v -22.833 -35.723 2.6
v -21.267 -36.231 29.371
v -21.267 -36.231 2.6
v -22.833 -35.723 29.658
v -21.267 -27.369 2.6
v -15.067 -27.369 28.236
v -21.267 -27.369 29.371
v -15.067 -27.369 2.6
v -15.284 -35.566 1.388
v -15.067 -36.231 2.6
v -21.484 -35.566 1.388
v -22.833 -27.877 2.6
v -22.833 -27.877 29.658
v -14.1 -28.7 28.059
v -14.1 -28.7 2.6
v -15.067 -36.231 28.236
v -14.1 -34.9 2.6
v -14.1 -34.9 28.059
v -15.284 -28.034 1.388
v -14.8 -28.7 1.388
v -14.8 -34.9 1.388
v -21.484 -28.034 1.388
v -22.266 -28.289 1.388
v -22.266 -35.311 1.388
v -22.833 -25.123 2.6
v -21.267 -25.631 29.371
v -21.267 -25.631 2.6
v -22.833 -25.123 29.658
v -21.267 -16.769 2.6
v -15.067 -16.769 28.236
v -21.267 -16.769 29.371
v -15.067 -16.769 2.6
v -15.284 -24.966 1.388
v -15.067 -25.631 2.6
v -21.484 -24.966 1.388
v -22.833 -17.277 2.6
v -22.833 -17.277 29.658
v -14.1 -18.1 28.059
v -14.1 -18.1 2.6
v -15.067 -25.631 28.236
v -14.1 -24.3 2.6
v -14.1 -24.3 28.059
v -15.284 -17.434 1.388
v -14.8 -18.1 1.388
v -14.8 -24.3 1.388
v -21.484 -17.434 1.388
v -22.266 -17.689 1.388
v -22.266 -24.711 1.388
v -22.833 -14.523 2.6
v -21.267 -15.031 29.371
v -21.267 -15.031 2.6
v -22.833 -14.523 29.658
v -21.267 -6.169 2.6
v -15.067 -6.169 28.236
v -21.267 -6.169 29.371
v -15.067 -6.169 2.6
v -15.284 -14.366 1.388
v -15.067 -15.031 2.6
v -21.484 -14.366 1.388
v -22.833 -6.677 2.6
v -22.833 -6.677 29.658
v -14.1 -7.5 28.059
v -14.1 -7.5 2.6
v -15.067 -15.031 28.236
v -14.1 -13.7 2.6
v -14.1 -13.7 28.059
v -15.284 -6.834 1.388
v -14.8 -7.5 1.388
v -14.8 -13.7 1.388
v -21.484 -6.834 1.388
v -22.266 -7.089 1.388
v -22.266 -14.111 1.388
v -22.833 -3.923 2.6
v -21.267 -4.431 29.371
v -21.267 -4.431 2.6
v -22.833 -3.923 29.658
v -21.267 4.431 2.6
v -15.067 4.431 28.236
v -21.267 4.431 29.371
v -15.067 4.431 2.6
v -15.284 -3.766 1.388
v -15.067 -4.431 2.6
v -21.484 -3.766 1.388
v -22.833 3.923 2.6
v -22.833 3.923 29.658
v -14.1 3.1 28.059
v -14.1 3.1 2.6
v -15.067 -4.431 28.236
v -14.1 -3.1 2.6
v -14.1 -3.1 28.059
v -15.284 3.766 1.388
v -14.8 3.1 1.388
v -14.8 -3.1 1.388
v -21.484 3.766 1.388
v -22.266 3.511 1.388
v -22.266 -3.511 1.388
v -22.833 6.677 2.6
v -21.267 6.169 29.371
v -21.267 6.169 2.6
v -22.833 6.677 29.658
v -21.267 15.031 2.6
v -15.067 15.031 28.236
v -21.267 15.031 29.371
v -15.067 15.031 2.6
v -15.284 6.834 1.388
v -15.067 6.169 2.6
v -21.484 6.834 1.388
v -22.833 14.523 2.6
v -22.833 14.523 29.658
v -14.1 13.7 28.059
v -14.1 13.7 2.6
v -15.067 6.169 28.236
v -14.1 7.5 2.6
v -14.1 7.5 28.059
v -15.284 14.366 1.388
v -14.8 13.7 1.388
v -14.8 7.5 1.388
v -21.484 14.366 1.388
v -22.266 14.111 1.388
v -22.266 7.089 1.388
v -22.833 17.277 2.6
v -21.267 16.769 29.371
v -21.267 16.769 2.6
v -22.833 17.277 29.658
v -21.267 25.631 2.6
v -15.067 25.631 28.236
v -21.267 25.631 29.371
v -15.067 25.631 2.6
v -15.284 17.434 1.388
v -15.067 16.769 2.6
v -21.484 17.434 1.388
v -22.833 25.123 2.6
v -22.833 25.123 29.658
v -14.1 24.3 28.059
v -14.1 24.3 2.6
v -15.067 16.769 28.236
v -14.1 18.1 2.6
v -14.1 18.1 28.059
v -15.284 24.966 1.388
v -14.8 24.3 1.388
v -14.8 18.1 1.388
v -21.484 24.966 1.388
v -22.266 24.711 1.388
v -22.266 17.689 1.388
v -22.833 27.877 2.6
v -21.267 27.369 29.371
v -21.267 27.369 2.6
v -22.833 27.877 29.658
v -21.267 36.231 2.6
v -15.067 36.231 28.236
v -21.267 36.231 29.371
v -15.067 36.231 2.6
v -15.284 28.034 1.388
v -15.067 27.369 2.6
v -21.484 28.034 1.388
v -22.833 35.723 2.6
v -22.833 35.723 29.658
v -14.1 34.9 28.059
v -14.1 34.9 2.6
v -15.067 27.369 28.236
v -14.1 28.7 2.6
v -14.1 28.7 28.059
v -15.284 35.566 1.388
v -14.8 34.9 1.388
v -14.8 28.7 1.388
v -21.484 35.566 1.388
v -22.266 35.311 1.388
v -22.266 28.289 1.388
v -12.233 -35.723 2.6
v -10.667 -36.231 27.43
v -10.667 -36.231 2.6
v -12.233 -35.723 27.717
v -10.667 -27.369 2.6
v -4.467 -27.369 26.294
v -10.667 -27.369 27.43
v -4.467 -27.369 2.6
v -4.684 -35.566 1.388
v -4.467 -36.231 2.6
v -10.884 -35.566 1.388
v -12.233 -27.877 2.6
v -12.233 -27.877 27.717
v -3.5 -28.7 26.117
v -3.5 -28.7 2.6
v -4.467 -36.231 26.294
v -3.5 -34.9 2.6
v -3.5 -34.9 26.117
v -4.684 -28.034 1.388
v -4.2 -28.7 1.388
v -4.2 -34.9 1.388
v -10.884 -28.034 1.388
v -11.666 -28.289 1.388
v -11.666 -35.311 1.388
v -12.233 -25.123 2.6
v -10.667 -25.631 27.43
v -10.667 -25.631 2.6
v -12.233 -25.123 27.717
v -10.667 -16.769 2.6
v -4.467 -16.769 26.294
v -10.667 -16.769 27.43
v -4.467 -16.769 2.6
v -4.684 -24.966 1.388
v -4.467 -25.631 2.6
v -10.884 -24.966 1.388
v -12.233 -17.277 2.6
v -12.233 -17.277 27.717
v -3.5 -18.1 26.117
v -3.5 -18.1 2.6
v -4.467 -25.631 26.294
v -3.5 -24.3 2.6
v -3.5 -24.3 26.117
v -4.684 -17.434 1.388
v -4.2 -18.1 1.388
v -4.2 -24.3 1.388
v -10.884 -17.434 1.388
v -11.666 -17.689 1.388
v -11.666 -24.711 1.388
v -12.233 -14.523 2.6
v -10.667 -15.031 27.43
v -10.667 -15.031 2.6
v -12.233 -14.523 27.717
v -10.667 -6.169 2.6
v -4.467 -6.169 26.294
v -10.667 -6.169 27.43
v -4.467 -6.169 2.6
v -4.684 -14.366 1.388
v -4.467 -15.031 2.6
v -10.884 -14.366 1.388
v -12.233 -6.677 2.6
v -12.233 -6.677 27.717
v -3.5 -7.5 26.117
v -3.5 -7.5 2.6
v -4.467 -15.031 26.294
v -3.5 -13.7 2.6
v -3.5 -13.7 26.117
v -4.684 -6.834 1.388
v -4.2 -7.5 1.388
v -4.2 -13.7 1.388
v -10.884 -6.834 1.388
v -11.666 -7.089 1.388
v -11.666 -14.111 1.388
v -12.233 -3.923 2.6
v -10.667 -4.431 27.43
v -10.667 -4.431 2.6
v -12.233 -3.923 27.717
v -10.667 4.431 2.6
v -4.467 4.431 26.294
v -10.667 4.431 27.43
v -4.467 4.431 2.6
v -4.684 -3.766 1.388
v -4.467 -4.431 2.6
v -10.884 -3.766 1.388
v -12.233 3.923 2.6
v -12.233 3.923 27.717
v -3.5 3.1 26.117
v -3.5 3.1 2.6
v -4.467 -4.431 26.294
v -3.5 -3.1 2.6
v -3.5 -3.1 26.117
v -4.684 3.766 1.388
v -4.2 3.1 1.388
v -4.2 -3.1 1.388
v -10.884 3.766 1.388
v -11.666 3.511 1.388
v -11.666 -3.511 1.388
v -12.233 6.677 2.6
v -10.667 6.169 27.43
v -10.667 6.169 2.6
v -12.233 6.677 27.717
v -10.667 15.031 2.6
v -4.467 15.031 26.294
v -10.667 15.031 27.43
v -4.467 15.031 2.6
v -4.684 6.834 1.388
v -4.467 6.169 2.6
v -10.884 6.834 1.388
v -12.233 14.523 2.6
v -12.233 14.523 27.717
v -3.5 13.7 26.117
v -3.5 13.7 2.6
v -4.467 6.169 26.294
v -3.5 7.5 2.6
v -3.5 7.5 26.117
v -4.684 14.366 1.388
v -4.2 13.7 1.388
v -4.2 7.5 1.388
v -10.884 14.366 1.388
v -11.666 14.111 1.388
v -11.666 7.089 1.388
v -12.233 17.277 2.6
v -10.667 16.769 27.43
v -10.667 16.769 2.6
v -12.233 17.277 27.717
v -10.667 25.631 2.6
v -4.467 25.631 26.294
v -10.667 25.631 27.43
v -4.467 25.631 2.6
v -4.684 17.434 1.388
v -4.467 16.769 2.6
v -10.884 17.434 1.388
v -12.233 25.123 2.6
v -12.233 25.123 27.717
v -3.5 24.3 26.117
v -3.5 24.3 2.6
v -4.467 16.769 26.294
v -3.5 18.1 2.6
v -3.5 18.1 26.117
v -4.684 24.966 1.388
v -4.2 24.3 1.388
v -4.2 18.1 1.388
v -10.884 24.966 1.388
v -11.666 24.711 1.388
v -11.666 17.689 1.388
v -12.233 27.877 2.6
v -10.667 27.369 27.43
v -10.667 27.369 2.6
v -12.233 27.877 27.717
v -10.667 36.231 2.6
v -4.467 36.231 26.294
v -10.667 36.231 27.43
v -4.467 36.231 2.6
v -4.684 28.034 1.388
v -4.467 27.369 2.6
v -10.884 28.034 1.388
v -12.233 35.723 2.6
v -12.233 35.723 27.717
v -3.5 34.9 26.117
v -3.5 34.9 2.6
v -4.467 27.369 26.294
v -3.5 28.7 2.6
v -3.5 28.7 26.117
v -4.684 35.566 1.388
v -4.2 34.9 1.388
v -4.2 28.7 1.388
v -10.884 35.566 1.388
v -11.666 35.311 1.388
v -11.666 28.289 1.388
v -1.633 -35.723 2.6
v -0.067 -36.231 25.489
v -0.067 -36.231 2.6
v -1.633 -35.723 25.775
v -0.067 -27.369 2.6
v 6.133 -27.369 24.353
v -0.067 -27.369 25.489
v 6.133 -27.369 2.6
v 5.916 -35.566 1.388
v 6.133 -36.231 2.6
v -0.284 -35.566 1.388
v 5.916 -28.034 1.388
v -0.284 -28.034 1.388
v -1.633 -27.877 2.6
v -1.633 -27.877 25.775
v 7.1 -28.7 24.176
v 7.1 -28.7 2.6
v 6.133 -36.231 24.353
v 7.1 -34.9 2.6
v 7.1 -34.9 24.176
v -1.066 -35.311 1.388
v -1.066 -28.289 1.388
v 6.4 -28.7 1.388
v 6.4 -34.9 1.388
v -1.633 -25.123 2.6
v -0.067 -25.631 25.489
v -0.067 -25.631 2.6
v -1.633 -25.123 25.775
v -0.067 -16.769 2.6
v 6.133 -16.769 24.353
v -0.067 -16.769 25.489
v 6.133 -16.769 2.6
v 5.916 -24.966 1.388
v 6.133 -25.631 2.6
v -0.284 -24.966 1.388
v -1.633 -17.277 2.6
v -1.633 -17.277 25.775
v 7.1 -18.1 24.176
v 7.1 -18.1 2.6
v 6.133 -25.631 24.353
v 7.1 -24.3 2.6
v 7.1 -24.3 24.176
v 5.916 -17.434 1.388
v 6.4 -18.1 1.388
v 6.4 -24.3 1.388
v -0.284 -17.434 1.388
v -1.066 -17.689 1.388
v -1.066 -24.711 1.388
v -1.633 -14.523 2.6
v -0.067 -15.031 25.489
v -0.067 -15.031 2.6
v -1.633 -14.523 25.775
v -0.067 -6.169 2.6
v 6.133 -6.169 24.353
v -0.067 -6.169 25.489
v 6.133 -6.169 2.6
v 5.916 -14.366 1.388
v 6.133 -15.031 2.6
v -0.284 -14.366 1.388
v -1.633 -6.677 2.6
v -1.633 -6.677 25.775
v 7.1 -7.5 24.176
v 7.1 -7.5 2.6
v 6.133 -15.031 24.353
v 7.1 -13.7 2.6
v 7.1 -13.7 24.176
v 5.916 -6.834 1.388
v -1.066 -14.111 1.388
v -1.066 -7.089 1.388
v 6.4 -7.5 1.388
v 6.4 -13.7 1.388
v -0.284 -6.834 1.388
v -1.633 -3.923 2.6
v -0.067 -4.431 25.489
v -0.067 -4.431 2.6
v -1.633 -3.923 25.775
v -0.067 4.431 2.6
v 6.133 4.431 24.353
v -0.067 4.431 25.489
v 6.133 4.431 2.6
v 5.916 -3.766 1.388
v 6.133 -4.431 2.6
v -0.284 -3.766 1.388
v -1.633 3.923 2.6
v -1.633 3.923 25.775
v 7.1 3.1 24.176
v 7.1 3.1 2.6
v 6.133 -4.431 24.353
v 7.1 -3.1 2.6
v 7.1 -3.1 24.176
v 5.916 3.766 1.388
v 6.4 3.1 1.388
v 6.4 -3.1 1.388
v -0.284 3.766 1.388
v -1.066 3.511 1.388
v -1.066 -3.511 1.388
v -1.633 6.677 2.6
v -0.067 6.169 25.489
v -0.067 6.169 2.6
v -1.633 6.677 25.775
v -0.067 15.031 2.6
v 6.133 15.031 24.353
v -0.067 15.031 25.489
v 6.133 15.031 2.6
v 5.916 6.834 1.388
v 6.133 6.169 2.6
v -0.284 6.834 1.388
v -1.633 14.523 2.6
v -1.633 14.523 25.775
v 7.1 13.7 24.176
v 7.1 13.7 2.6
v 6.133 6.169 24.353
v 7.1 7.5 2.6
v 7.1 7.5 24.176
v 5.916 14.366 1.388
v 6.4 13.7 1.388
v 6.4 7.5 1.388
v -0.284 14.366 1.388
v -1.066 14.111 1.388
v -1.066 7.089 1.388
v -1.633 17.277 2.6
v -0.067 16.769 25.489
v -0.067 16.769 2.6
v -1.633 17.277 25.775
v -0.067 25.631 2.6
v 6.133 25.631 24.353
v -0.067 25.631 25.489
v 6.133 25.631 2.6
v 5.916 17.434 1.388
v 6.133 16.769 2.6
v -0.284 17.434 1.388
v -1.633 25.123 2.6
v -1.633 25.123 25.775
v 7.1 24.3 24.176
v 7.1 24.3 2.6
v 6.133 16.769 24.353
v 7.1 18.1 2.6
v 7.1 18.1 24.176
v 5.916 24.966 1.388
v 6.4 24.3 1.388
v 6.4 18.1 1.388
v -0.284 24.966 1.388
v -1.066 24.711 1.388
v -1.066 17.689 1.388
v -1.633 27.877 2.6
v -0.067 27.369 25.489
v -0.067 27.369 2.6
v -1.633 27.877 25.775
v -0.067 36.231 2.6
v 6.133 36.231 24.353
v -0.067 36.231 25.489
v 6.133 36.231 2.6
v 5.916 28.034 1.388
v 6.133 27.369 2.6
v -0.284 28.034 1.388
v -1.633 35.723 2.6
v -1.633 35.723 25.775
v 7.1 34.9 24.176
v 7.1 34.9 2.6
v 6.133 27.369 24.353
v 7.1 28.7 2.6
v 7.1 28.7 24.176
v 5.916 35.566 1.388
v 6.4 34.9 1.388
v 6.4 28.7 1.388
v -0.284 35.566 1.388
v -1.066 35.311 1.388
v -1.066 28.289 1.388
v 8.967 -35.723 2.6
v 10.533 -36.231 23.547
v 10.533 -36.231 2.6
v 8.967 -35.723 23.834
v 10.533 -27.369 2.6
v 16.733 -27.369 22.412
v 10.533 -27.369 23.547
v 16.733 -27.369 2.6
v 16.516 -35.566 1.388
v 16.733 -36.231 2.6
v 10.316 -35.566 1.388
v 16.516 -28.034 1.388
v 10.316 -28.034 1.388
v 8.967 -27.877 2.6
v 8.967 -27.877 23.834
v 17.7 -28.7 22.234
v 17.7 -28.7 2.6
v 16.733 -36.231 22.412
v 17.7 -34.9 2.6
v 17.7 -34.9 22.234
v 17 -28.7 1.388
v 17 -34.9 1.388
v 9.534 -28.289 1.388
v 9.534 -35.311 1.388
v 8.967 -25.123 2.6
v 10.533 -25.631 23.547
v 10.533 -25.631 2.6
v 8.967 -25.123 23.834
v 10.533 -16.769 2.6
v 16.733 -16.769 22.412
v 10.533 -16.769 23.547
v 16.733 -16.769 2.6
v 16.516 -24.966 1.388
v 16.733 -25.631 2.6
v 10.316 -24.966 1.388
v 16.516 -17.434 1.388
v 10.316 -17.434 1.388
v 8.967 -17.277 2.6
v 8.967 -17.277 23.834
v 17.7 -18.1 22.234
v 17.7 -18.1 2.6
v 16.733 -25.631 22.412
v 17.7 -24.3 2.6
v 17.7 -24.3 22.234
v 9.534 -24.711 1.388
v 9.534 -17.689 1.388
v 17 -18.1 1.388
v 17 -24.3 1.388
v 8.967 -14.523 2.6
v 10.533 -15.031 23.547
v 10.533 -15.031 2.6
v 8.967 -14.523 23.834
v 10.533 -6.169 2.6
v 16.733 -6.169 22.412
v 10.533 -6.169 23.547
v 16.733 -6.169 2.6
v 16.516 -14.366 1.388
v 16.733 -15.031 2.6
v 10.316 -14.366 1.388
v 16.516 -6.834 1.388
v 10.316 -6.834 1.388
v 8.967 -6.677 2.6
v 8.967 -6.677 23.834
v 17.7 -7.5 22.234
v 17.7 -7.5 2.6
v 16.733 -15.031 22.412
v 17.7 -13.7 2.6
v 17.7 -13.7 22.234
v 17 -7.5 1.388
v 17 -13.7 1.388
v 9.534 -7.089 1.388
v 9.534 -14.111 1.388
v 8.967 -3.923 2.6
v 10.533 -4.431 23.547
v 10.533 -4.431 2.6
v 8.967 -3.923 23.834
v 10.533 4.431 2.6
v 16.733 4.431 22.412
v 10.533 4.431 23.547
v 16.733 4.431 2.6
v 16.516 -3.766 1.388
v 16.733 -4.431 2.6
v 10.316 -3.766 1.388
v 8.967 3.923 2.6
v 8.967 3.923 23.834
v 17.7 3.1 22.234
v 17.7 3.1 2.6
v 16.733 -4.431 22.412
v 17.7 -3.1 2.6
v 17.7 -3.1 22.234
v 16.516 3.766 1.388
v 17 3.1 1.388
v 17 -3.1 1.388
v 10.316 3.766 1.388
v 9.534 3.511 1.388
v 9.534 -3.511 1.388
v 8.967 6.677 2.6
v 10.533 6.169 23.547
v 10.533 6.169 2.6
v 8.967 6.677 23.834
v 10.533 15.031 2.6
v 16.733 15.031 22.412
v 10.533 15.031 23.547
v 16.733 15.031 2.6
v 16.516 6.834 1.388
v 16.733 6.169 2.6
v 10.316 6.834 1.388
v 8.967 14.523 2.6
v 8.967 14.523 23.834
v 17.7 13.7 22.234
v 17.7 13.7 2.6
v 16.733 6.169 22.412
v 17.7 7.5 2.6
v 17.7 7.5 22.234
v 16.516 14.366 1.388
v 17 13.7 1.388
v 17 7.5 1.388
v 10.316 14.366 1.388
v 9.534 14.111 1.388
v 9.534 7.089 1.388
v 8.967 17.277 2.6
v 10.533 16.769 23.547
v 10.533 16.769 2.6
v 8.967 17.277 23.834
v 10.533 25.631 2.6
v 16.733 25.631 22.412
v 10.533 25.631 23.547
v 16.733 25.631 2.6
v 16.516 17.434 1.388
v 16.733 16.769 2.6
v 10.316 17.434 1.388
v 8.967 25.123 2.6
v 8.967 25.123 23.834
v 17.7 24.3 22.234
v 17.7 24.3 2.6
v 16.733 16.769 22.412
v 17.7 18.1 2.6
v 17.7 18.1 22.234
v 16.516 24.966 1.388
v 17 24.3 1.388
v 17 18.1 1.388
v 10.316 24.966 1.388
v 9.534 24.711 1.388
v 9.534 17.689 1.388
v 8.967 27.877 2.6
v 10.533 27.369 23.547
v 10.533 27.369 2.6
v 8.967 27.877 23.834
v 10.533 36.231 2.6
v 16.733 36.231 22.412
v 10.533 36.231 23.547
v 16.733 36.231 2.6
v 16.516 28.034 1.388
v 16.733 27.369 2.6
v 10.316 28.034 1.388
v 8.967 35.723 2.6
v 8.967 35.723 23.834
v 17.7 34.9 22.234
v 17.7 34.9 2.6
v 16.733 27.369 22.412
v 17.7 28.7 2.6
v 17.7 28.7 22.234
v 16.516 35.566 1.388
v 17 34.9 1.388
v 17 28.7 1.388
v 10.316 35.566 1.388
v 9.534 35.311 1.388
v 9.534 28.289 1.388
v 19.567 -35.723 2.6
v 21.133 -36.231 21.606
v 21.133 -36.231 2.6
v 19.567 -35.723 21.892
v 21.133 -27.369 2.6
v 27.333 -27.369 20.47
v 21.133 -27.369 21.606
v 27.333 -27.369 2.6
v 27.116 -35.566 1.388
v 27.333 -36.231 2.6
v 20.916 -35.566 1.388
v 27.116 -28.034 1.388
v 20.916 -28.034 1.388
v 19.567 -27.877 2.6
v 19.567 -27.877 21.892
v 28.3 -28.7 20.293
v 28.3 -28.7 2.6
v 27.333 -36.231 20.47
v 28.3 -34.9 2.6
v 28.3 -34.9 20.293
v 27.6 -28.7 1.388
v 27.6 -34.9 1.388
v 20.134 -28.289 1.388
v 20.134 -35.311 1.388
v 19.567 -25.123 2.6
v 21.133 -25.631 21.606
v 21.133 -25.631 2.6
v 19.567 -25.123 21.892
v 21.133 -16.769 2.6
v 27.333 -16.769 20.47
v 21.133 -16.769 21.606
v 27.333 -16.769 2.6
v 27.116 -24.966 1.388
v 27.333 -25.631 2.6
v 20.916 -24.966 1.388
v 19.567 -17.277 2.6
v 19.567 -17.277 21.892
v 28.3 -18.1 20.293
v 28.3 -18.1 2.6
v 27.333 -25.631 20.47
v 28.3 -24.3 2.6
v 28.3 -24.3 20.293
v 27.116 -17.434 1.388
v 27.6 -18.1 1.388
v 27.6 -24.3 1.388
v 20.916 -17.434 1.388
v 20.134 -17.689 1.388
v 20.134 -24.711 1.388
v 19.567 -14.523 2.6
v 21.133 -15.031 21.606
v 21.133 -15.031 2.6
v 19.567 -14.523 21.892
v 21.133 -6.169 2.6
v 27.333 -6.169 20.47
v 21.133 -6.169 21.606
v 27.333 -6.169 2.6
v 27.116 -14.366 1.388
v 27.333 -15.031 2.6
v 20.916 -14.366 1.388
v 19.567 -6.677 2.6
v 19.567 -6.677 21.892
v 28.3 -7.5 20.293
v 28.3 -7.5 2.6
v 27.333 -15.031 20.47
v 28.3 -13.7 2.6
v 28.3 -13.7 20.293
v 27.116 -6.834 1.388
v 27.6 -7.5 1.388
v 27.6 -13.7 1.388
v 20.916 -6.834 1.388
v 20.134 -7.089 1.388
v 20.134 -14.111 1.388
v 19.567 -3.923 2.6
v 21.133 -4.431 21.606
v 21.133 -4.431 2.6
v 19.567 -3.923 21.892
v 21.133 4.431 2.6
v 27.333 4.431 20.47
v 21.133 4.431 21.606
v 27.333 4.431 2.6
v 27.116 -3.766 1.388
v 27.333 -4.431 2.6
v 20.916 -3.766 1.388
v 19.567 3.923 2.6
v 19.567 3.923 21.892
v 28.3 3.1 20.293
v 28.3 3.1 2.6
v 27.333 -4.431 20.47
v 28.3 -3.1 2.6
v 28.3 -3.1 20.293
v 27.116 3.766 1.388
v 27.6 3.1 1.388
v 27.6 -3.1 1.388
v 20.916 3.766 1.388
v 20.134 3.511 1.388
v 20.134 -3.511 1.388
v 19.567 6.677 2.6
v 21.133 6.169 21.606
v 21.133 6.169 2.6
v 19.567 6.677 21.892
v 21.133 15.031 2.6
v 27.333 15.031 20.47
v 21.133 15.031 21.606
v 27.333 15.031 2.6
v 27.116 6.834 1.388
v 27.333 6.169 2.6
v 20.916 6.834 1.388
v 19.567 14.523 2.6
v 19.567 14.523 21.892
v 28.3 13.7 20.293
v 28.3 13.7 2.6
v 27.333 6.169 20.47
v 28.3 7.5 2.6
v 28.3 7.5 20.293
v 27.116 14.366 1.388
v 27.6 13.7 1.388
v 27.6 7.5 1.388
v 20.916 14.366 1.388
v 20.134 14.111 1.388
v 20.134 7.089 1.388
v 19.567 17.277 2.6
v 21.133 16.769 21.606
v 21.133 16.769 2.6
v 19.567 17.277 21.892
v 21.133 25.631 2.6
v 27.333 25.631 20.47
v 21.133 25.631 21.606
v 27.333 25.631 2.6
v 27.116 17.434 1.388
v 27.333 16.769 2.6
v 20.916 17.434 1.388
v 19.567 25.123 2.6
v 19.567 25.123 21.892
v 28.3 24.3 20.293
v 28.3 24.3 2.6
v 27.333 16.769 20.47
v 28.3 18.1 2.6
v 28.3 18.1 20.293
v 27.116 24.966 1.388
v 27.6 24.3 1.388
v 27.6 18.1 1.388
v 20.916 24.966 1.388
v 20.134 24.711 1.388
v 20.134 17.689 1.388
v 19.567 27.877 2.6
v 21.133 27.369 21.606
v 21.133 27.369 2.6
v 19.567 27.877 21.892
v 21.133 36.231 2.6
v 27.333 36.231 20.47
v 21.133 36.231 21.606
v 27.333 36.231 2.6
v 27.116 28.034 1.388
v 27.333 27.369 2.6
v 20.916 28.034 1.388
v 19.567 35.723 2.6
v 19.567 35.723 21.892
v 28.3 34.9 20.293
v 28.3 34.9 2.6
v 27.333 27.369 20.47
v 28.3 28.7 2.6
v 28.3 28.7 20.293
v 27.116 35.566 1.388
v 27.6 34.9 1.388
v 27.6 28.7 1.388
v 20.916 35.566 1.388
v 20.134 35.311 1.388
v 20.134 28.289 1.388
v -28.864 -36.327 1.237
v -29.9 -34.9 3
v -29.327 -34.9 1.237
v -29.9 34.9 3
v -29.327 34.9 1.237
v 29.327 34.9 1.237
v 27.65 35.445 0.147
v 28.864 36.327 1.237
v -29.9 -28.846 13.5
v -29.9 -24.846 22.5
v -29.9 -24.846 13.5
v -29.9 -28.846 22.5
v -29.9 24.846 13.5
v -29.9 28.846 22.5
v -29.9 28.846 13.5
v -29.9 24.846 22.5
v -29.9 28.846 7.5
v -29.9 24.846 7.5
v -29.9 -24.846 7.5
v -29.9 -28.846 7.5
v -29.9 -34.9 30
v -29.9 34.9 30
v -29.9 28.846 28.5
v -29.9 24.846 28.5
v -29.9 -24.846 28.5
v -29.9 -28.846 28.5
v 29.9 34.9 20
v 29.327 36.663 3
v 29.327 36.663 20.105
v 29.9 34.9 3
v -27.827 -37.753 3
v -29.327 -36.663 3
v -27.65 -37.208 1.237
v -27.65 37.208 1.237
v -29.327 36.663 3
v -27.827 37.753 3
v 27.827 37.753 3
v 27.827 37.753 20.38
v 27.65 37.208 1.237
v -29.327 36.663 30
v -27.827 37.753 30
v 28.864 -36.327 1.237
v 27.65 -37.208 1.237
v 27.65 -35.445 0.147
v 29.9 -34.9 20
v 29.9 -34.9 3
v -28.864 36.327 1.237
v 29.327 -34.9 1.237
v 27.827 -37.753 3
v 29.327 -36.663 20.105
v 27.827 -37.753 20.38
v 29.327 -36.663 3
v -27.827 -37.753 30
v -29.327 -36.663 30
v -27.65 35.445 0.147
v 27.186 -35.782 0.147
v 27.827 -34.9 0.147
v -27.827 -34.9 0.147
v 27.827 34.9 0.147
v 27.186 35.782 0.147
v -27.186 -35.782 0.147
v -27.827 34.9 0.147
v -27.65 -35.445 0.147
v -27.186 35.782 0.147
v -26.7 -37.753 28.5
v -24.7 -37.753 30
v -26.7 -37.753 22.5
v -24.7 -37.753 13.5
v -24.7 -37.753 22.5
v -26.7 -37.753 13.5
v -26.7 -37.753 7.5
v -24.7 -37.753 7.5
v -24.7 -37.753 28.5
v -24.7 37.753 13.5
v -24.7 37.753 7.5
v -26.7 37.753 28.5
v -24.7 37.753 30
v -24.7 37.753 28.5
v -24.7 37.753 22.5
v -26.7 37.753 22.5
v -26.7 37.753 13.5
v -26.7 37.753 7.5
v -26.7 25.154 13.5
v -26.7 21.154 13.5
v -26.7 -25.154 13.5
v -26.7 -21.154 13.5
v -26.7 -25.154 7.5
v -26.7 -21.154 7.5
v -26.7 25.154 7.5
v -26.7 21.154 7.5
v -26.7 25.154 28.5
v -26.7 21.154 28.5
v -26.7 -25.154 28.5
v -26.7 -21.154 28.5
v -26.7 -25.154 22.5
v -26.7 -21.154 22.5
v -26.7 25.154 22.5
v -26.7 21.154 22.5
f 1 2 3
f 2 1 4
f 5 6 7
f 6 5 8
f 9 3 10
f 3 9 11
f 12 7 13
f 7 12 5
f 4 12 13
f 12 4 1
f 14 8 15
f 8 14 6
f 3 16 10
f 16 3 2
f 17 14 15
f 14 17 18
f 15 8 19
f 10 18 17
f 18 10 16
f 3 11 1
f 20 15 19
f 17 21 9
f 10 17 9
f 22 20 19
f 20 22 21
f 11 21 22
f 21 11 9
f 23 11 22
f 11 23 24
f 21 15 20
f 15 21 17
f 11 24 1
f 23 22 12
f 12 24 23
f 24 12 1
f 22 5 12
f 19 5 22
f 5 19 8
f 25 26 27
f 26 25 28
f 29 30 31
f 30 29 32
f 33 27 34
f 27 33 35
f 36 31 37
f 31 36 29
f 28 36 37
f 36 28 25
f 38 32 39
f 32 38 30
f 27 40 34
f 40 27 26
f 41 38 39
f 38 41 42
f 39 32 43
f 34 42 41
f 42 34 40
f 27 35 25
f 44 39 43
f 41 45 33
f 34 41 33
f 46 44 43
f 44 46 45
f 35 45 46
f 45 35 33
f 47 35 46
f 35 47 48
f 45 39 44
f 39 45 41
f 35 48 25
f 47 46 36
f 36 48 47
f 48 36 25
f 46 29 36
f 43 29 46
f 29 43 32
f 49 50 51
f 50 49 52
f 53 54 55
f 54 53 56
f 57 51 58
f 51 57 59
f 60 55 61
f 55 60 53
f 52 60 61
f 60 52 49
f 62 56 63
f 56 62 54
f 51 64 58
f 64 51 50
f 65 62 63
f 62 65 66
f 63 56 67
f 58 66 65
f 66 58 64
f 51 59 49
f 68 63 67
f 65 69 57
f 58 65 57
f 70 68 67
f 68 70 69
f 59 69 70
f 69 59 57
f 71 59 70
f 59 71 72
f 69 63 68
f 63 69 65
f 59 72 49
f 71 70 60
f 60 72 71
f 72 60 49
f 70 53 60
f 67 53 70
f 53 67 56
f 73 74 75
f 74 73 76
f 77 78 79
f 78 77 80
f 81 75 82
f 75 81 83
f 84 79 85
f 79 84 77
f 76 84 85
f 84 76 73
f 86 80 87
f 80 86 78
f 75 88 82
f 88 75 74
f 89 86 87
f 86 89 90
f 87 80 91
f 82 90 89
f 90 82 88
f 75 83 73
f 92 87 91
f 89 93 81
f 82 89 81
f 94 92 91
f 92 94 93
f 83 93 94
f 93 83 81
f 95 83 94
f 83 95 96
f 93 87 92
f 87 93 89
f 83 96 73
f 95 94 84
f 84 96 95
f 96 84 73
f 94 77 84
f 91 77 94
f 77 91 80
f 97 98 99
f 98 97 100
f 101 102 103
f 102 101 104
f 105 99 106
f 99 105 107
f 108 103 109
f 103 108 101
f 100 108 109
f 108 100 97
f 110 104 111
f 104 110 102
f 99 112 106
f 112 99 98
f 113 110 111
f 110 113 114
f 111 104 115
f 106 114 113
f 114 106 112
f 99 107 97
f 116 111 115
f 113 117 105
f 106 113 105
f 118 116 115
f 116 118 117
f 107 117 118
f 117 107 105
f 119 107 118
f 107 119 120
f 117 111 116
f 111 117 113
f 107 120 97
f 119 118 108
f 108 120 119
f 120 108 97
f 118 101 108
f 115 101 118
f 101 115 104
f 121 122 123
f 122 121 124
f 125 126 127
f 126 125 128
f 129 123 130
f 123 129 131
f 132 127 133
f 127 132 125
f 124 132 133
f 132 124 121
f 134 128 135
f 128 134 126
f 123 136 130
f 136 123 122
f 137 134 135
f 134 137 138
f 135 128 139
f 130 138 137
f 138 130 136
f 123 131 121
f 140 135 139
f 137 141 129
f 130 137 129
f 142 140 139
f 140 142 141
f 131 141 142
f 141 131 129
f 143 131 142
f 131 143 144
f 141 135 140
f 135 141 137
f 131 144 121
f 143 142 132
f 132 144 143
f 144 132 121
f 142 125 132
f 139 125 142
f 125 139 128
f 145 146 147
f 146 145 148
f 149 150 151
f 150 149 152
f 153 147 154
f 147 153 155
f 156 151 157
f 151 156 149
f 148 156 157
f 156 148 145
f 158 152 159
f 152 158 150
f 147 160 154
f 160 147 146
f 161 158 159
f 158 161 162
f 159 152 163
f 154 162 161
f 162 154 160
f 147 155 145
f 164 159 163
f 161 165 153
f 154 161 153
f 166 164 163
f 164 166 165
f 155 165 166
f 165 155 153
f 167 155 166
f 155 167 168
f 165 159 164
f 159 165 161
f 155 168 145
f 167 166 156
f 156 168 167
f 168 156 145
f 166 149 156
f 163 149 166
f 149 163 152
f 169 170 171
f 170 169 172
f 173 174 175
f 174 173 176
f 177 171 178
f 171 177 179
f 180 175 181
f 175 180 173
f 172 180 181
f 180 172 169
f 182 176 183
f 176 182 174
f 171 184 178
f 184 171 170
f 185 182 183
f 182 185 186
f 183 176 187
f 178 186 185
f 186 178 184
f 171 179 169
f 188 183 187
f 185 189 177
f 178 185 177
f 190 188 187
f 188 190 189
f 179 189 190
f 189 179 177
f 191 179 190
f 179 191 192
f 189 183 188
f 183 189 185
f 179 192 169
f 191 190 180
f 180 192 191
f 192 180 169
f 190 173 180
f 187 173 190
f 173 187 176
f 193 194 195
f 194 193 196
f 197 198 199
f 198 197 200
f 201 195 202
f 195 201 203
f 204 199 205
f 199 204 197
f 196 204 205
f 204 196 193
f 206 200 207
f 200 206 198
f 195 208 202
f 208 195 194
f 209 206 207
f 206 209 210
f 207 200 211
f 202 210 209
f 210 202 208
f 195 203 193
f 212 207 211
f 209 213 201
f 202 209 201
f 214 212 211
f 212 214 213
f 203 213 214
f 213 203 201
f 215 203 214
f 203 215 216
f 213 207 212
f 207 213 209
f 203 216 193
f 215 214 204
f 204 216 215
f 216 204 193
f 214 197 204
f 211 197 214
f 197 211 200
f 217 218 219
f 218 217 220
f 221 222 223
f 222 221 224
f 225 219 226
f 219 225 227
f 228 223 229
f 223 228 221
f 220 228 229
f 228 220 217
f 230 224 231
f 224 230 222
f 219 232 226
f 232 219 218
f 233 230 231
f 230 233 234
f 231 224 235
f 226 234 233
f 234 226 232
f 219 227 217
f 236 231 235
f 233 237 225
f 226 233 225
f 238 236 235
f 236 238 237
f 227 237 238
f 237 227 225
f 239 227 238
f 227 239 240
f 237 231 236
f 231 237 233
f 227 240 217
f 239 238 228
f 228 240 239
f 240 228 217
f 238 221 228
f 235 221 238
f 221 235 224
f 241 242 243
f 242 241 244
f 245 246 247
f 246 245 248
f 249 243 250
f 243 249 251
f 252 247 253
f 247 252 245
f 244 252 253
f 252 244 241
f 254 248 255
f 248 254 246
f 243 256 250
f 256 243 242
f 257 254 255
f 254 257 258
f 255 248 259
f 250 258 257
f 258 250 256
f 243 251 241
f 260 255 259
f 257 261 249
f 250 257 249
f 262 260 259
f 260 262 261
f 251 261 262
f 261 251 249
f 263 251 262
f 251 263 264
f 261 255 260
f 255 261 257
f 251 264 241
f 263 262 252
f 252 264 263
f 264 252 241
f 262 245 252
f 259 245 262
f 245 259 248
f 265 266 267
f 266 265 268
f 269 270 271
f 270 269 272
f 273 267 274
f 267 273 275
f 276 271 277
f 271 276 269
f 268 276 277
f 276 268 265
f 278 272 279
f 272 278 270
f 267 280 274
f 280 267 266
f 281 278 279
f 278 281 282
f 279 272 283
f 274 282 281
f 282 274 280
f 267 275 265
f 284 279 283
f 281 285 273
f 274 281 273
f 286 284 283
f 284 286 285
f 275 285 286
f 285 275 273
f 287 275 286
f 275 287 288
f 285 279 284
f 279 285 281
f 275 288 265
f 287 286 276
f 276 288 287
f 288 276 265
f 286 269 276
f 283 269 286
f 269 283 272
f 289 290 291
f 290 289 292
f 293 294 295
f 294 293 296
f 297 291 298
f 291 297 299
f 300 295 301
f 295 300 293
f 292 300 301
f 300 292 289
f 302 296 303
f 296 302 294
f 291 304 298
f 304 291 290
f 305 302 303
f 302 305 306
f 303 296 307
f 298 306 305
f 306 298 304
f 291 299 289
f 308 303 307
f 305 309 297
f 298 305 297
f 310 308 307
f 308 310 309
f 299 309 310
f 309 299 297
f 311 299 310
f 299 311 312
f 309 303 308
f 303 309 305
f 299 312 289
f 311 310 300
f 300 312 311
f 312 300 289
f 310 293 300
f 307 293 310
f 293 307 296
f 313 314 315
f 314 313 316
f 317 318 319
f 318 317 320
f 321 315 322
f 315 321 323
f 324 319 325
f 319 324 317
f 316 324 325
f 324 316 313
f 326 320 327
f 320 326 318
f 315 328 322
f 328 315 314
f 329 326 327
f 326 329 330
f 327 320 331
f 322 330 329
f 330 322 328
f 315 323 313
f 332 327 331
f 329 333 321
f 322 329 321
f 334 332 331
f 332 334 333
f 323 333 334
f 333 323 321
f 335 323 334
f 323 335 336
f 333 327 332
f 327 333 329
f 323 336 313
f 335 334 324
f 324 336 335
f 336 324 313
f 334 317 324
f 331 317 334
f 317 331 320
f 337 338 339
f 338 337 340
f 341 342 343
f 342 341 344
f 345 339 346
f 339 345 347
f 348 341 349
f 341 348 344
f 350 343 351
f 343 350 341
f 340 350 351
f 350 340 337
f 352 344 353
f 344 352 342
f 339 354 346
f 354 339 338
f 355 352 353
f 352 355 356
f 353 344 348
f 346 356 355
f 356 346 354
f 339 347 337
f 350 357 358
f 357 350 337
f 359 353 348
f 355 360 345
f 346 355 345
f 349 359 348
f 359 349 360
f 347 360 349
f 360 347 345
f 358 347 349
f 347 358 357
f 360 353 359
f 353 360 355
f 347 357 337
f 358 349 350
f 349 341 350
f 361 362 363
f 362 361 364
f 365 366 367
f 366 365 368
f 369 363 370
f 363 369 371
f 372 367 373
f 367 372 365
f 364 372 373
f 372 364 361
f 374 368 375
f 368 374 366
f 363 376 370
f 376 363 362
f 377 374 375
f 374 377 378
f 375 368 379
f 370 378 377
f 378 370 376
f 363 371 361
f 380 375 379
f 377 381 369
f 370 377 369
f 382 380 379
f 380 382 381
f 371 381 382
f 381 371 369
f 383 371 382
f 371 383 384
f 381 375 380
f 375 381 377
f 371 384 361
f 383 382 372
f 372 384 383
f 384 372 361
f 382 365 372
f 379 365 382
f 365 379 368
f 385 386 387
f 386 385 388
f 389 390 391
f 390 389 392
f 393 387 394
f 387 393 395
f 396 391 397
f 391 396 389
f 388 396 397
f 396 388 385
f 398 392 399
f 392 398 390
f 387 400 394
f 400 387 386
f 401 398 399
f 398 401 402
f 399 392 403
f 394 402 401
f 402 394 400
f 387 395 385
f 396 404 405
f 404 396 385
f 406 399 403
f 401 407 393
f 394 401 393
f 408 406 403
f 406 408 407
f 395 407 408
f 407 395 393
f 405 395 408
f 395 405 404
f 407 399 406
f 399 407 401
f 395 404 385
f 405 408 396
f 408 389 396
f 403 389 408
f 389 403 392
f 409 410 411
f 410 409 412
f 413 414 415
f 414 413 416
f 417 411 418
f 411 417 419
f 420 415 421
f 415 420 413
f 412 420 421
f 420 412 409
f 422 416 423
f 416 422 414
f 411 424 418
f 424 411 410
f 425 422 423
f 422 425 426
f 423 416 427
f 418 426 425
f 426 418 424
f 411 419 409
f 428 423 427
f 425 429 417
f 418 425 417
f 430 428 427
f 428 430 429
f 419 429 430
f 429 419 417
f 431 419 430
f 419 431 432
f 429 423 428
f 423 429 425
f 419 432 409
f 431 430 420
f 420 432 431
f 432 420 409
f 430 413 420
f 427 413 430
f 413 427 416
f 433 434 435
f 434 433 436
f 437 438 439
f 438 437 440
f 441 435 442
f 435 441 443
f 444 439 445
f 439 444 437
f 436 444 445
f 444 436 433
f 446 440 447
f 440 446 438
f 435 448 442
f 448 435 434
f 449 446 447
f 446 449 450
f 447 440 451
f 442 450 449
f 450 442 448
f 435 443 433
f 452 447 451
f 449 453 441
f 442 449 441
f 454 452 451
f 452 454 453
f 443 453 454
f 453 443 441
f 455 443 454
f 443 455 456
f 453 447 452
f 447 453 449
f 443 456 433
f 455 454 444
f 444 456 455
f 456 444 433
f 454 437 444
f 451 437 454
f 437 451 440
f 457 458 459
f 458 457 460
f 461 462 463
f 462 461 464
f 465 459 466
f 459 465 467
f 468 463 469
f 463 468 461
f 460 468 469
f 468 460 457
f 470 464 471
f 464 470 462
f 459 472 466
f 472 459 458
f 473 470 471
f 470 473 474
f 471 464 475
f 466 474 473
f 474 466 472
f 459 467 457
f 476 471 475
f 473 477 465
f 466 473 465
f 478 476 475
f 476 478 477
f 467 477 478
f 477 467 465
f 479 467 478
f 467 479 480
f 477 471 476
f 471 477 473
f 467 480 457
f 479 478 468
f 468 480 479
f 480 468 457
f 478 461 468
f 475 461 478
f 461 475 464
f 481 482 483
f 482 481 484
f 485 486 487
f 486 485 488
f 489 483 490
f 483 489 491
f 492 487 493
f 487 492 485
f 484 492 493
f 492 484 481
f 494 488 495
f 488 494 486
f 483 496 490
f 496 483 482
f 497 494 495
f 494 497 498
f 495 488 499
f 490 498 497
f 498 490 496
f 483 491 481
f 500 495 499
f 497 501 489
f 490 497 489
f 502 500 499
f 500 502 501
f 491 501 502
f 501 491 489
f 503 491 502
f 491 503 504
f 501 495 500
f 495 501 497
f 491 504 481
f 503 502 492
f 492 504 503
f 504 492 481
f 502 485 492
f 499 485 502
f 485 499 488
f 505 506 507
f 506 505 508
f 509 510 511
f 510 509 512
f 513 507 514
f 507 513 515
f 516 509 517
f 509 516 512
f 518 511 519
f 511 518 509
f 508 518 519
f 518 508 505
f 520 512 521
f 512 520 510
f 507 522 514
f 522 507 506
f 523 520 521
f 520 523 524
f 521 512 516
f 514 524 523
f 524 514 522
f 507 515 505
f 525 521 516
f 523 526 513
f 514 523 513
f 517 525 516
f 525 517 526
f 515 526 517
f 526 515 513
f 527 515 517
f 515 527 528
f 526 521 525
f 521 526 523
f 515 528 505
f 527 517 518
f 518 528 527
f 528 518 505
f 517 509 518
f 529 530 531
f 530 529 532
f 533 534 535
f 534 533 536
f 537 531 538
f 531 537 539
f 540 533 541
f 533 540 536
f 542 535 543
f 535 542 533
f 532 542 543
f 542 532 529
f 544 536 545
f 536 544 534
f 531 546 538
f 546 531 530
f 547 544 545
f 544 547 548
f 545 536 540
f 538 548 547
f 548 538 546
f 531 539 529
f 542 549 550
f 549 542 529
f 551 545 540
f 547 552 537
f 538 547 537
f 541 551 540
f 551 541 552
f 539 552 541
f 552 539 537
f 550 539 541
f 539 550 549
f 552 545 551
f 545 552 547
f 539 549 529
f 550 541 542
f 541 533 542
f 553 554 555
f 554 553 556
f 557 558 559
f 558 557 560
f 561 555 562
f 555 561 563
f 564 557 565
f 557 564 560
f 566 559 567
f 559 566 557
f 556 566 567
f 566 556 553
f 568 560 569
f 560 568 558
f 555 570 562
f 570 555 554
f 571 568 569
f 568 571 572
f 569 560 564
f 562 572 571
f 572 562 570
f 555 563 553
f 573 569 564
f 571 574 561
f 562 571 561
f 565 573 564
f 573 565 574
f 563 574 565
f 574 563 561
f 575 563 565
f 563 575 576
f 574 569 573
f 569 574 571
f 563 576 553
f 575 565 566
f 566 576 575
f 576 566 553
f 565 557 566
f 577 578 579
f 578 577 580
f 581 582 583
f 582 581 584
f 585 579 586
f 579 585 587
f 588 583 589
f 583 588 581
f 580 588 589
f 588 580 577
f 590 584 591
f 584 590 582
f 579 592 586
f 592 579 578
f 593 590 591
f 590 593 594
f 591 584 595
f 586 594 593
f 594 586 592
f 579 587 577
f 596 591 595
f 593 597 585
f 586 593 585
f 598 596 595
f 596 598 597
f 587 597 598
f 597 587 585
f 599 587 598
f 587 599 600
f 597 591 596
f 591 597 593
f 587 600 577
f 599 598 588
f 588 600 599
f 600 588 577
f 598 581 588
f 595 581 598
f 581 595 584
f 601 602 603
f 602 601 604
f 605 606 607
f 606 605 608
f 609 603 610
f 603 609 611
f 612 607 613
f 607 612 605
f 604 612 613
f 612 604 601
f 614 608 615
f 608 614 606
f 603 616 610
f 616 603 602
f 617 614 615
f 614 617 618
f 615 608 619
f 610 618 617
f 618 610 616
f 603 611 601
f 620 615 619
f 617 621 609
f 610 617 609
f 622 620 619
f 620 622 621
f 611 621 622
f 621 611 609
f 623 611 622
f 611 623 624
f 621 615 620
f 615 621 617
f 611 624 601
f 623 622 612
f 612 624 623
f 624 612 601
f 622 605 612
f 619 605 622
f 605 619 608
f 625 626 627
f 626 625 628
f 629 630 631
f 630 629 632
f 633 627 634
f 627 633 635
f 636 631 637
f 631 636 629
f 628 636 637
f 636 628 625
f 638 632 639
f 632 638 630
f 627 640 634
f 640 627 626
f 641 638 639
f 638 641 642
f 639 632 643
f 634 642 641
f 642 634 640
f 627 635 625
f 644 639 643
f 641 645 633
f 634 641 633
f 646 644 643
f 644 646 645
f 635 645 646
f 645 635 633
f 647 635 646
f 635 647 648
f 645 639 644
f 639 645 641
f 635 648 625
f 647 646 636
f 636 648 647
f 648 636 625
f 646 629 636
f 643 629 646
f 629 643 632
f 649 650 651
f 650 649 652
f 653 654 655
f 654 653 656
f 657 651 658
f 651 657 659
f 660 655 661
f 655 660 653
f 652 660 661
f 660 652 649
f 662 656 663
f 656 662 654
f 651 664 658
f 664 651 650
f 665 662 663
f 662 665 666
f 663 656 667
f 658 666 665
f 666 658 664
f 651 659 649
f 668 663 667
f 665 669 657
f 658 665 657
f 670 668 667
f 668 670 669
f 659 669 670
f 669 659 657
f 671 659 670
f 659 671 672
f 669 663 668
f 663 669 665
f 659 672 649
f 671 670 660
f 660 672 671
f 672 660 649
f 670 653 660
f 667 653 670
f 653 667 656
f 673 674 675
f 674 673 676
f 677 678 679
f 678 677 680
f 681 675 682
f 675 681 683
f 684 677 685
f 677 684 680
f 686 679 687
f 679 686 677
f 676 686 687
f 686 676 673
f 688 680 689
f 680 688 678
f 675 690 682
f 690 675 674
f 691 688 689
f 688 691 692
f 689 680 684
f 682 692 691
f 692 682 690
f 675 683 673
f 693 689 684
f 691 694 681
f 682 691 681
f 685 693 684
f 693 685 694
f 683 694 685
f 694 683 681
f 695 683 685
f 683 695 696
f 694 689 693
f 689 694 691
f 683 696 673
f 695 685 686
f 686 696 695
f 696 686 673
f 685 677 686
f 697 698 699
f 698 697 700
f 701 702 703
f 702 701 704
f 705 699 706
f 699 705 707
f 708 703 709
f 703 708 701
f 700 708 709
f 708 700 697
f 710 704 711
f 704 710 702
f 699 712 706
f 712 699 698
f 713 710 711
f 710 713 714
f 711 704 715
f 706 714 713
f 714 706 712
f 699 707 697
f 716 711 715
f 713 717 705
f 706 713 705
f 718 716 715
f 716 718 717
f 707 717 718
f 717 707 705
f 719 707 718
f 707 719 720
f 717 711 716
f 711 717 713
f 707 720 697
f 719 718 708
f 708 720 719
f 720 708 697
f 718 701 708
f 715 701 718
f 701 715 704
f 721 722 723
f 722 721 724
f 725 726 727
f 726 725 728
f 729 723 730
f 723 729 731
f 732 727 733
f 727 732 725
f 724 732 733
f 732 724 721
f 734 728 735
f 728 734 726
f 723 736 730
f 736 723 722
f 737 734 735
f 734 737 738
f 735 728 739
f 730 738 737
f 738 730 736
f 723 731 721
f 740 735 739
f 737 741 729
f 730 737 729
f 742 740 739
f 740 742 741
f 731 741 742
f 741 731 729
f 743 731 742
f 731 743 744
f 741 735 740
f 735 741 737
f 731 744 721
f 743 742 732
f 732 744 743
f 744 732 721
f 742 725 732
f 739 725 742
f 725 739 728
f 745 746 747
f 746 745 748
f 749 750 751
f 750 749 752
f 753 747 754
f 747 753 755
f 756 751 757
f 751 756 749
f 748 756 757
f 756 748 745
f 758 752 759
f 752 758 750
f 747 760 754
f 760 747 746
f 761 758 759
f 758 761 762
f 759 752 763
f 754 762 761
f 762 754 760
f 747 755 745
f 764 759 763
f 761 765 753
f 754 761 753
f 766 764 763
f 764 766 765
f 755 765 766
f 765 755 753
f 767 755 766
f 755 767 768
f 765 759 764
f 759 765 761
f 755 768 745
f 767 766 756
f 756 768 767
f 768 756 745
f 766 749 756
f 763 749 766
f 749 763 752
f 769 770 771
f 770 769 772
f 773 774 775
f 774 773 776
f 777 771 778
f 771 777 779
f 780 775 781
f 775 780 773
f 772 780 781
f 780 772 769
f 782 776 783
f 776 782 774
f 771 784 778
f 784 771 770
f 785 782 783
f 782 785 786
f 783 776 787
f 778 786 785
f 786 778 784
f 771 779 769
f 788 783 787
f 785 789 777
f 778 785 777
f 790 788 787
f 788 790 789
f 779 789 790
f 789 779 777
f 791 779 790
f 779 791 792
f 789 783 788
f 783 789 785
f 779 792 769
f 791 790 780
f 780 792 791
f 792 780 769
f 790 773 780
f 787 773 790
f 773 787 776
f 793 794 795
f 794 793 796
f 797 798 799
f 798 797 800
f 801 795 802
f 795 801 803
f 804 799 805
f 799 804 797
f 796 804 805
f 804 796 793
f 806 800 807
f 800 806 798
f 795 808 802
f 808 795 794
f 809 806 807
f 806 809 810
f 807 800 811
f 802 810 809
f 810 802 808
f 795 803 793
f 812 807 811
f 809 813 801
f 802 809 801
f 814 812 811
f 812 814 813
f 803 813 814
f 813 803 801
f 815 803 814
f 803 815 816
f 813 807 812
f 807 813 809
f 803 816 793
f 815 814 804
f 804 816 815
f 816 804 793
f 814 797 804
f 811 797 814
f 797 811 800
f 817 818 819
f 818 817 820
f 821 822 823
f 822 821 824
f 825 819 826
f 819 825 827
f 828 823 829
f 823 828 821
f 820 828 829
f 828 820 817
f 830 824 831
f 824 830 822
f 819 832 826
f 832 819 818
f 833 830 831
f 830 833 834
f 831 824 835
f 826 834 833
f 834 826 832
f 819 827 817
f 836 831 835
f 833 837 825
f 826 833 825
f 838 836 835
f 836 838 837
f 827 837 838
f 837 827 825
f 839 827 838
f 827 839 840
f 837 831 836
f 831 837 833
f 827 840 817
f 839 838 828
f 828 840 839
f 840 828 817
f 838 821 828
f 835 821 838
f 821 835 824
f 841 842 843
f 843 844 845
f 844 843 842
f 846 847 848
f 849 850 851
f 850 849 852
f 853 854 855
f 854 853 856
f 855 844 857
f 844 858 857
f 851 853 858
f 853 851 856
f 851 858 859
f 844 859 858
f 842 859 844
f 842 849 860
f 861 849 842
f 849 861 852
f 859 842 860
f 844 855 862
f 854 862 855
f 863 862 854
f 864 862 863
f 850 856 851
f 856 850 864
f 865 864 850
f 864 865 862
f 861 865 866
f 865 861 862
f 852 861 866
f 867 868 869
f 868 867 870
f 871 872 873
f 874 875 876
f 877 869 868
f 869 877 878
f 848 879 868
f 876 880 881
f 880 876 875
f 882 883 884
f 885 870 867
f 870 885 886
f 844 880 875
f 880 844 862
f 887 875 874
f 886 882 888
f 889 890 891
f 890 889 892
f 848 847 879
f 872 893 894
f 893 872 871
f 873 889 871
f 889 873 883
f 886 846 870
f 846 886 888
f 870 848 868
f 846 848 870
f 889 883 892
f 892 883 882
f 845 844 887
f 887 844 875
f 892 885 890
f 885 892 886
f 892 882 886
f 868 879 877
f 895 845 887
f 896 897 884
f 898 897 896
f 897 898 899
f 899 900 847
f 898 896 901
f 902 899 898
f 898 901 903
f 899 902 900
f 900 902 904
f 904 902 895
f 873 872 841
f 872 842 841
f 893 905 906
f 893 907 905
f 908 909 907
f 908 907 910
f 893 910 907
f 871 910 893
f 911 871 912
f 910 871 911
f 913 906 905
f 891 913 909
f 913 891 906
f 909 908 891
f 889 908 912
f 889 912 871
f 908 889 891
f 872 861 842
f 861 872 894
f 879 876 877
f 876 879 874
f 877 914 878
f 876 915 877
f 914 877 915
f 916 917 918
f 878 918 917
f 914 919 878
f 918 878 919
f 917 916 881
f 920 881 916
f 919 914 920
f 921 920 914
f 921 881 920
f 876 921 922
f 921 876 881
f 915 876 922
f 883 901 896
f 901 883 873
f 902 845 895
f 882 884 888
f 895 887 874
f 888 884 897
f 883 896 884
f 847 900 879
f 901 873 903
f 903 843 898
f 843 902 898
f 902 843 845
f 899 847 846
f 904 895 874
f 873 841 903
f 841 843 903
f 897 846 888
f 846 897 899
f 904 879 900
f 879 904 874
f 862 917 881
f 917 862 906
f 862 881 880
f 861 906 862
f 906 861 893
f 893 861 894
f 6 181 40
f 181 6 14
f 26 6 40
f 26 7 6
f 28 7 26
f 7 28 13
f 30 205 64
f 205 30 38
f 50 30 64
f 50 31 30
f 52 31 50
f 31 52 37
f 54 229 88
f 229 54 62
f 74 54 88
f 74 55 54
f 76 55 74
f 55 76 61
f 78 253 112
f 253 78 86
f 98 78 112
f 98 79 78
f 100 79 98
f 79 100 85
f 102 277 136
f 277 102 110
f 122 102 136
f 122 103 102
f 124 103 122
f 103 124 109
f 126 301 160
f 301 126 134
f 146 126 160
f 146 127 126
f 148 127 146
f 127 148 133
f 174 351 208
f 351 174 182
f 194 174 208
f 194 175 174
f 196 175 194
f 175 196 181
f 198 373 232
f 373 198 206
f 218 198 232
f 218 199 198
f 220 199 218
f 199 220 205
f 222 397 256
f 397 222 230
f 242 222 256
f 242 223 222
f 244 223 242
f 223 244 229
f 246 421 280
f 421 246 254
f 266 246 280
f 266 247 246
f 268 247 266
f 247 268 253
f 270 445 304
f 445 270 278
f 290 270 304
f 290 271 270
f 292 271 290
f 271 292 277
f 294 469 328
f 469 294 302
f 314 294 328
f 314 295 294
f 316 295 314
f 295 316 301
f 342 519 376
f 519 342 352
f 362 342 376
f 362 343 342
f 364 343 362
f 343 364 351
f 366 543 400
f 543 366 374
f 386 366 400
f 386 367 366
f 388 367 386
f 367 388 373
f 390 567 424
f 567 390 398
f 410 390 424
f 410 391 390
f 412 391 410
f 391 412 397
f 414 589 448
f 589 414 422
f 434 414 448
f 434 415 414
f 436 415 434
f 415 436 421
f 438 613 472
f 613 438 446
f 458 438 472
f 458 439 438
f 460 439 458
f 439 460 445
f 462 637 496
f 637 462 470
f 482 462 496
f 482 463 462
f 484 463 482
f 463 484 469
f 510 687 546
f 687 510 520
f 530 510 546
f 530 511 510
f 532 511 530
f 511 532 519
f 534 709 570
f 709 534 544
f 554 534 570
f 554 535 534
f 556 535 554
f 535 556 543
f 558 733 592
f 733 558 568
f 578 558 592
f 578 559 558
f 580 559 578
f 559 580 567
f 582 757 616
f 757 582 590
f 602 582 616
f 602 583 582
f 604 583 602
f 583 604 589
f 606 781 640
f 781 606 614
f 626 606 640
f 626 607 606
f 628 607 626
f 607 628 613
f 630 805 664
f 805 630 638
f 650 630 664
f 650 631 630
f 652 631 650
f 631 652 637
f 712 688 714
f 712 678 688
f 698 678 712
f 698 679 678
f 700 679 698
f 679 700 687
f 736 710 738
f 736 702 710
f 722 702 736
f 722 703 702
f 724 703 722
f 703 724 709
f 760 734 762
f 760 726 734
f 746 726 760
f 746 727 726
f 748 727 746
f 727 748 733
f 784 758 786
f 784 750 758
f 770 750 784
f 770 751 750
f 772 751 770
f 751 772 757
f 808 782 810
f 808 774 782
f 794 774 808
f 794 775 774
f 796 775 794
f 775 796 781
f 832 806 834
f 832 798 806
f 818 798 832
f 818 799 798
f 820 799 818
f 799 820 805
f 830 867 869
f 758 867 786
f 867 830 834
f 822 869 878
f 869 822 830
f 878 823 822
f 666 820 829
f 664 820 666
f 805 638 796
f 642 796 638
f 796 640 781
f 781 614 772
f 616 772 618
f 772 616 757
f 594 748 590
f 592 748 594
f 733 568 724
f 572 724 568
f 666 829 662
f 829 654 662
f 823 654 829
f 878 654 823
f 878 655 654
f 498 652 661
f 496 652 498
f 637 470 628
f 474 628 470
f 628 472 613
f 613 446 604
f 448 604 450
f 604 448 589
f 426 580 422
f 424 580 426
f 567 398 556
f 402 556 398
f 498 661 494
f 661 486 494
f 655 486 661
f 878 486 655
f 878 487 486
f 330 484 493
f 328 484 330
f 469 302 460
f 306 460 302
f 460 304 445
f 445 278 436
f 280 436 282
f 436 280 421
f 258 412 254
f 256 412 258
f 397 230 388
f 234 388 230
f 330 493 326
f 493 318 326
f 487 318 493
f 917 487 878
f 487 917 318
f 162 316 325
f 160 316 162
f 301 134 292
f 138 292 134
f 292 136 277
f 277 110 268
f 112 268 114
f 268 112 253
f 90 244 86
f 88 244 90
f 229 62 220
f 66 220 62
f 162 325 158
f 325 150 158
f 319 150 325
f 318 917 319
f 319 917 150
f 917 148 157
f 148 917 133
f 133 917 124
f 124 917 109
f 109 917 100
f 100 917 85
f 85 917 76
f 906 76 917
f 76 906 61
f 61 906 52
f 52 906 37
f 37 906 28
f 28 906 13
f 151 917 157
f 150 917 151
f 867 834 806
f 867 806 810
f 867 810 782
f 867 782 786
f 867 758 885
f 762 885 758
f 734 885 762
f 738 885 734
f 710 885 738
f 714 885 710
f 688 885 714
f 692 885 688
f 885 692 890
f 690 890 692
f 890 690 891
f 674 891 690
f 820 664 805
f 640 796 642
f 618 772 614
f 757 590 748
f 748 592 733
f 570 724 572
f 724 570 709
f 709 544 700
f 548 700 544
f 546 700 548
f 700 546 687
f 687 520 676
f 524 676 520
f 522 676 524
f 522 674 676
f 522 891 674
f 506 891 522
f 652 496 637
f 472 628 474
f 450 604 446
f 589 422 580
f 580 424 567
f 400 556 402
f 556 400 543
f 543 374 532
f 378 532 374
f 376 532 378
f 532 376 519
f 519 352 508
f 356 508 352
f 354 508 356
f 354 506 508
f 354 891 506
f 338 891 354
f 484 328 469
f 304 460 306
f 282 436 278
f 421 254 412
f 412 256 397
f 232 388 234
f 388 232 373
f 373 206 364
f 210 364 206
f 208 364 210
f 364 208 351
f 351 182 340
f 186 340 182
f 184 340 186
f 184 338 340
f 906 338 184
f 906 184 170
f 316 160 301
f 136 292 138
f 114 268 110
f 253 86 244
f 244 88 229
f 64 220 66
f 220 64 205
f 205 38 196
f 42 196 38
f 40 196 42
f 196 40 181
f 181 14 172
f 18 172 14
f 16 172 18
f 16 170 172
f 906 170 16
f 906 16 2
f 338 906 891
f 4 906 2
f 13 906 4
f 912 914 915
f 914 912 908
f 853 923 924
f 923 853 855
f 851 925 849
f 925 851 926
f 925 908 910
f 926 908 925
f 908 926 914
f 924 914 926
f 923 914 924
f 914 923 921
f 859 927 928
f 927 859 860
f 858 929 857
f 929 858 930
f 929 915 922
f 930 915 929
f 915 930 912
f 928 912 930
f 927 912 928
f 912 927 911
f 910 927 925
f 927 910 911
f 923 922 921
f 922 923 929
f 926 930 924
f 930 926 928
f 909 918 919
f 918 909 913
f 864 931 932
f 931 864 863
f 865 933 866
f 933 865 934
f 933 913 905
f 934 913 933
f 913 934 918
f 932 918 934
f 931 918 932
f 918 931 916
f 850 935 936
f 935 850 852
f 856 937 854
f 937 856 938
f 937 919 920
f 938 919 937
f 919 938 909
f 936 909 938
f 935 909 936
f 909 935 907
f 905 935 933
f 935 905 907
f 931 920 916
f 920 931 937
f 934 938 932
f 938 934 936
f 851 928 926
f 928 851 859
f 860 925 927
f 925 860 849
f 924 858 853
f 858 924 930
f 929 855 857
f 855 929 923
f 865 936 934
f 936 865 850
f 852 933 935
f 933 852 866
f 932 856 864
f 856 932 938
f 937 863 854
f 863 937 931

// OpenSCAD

// Number of cells in the x direction
num_cells_x = 5; // [1:12]

// Number of cells in the y direction
num_cells_y = 7; // [1:12]

// Inside size of each cell in the x direction
cell_size_x = 9; // [0:100]

// Inside size of each cell in the y direction
cell_size_y = 9; // [0:100]

// Max height of the tray (including bottom)
tray_max_height = 30; // [0:100]

// Height at front
height_at_front = 20; // [0:100]

// The width of the zip tie (add a couple of mm)
zip_width = 6; // [3:10]

// The thickness of the zip tie
zip_thickness = 2; // [1:5]

// Distance between the angled zip holes
distance_between_holes = 50; // [20:200]

// radius of rounding of the bottom (should be less than half the minimum cell dimension)
rounding = 3; // [1:50]

// thickness of the vertical walls
sidewall = 1.6;

// thickness of the bottom
bottom = 1.2;

// resolution used to render curved surfaces (experiment with low resolutions, and render the final results with higher resolution settings)
resolution = 16; // [30:Low (12 degrees), 60:Medium (6 degrees), 120:High (3 degrees)]


////////////////////////////////////////////////////////////

module roundedCube(x, y, z, fillet)
{
	if (fillet <= 0) {
		cube([x,y,z], center=true);
	} else {
    assign (x = x/2-fillet, y = y/2-fillet, z = z/2-fillet) {
			hull() {
				for(xx = [-x,x]) {
					for(yy = [-y,y]) {
						for(zz = [-z,z]) {
							translate([xx,yy,zz]) {
								sphere(fillet);
							}
						}
					}
				}
			}
		}
	}
}


module zip_hole(length, width, height)
{
  translate([-length/2, -5, 0])
  linear_extrude(height=height)
  polygon(points=[
      [0, 0],
      [0, width],
      [length, 10],
      [length, 10 - width]]);
}


mount_thickness = sidewall * 2;
back_addition = zip_thickness + mount_thickness;

xoutside = cell_size_x * num_cells_x + sidewall * (num_cells_x + 1) + back_addition;
youtside = cell_size_y * num_cells_y + sidewall * (num_cells_y + 1);

angled_mount_width = zip_thickness + 1;
mount1_height = tray_max_height/4;
mount2_height = tray_max_height/4*3;

difference() {
  translate([0, 0, tray_max_height])
  difference() {
    roundedCube(xoutside, youtside, tray_max_height*2, rounding);
    for (x = [0:num_cells_x-1]) {
      for (y = [0:num_cells_y-1]) {
        translate([
            -xoutside/2 + (sidewall + cell_size_x/2) + x * (sidewall + cell_size_x) + back_addition,
            -youtside/2 + (sidewall + cell_size_y/2) + y * (sidewall + cell_size_y), 0]) {
          roundedCube(cell_size_x, cell_size_y, (tray_max_height - bottom)*2, rounding - sidewall);
        }
      }
    }
    // Angled top
    translate([xoutside/2, youtside/2 + .5, -tray_max_height]) {
      rotate([0, -90, 90])
      linear_extrude(height=youtside + 1)
      polygon(points=[
          [height_at_front, 0],
          [height_at_front, -1],
          [tray_max_height*2 + 1, -1],
          [tray_max_height*2 + 1, xoutside + 1],
          [tray_max_height, xoutside + 1],
          [tray_max_height, xoutside - back_addition]]);
    }
  }
  // Ziptie paths
  translate([-xoutside/2 + mount_thickness, -youtside/2 - .5, 0]) {
    translate([0, 0, mount1_height])
      cube([zip_thickness, youtside + 1, zip_width]);
    translate([0, 0, mount2_height])
      cube([zip_thickness, youtside + 1, zip_width]);
  }
  translate([-(xoutside/2 - sidewall) , 0, 0]) {
    translate([0, 0, mount1_height]) {
      translate([0, -distance_between_holes/2, 0])
      zip_hole(back_addition, zip_thickness*2, zip_width);
      mirror([1, 0, 0])
      translate([0, distance_between_holes/2, 0])
      zip_hole(back_addition, zip_thickness*2, zip_width);
    }
    translate([0, 0, mount2_height]) {
      translate([0, -distance_between_holes/2, 0])
      zip_hole(back_addition, zip_thickness*2, zip_width);
      mirror([1, 0, 0])
      translate([0, distance_between_holes/2, 0])
      zip_hole(back_addition, zip_thickness*2, zip_width);
    }
  }
}
